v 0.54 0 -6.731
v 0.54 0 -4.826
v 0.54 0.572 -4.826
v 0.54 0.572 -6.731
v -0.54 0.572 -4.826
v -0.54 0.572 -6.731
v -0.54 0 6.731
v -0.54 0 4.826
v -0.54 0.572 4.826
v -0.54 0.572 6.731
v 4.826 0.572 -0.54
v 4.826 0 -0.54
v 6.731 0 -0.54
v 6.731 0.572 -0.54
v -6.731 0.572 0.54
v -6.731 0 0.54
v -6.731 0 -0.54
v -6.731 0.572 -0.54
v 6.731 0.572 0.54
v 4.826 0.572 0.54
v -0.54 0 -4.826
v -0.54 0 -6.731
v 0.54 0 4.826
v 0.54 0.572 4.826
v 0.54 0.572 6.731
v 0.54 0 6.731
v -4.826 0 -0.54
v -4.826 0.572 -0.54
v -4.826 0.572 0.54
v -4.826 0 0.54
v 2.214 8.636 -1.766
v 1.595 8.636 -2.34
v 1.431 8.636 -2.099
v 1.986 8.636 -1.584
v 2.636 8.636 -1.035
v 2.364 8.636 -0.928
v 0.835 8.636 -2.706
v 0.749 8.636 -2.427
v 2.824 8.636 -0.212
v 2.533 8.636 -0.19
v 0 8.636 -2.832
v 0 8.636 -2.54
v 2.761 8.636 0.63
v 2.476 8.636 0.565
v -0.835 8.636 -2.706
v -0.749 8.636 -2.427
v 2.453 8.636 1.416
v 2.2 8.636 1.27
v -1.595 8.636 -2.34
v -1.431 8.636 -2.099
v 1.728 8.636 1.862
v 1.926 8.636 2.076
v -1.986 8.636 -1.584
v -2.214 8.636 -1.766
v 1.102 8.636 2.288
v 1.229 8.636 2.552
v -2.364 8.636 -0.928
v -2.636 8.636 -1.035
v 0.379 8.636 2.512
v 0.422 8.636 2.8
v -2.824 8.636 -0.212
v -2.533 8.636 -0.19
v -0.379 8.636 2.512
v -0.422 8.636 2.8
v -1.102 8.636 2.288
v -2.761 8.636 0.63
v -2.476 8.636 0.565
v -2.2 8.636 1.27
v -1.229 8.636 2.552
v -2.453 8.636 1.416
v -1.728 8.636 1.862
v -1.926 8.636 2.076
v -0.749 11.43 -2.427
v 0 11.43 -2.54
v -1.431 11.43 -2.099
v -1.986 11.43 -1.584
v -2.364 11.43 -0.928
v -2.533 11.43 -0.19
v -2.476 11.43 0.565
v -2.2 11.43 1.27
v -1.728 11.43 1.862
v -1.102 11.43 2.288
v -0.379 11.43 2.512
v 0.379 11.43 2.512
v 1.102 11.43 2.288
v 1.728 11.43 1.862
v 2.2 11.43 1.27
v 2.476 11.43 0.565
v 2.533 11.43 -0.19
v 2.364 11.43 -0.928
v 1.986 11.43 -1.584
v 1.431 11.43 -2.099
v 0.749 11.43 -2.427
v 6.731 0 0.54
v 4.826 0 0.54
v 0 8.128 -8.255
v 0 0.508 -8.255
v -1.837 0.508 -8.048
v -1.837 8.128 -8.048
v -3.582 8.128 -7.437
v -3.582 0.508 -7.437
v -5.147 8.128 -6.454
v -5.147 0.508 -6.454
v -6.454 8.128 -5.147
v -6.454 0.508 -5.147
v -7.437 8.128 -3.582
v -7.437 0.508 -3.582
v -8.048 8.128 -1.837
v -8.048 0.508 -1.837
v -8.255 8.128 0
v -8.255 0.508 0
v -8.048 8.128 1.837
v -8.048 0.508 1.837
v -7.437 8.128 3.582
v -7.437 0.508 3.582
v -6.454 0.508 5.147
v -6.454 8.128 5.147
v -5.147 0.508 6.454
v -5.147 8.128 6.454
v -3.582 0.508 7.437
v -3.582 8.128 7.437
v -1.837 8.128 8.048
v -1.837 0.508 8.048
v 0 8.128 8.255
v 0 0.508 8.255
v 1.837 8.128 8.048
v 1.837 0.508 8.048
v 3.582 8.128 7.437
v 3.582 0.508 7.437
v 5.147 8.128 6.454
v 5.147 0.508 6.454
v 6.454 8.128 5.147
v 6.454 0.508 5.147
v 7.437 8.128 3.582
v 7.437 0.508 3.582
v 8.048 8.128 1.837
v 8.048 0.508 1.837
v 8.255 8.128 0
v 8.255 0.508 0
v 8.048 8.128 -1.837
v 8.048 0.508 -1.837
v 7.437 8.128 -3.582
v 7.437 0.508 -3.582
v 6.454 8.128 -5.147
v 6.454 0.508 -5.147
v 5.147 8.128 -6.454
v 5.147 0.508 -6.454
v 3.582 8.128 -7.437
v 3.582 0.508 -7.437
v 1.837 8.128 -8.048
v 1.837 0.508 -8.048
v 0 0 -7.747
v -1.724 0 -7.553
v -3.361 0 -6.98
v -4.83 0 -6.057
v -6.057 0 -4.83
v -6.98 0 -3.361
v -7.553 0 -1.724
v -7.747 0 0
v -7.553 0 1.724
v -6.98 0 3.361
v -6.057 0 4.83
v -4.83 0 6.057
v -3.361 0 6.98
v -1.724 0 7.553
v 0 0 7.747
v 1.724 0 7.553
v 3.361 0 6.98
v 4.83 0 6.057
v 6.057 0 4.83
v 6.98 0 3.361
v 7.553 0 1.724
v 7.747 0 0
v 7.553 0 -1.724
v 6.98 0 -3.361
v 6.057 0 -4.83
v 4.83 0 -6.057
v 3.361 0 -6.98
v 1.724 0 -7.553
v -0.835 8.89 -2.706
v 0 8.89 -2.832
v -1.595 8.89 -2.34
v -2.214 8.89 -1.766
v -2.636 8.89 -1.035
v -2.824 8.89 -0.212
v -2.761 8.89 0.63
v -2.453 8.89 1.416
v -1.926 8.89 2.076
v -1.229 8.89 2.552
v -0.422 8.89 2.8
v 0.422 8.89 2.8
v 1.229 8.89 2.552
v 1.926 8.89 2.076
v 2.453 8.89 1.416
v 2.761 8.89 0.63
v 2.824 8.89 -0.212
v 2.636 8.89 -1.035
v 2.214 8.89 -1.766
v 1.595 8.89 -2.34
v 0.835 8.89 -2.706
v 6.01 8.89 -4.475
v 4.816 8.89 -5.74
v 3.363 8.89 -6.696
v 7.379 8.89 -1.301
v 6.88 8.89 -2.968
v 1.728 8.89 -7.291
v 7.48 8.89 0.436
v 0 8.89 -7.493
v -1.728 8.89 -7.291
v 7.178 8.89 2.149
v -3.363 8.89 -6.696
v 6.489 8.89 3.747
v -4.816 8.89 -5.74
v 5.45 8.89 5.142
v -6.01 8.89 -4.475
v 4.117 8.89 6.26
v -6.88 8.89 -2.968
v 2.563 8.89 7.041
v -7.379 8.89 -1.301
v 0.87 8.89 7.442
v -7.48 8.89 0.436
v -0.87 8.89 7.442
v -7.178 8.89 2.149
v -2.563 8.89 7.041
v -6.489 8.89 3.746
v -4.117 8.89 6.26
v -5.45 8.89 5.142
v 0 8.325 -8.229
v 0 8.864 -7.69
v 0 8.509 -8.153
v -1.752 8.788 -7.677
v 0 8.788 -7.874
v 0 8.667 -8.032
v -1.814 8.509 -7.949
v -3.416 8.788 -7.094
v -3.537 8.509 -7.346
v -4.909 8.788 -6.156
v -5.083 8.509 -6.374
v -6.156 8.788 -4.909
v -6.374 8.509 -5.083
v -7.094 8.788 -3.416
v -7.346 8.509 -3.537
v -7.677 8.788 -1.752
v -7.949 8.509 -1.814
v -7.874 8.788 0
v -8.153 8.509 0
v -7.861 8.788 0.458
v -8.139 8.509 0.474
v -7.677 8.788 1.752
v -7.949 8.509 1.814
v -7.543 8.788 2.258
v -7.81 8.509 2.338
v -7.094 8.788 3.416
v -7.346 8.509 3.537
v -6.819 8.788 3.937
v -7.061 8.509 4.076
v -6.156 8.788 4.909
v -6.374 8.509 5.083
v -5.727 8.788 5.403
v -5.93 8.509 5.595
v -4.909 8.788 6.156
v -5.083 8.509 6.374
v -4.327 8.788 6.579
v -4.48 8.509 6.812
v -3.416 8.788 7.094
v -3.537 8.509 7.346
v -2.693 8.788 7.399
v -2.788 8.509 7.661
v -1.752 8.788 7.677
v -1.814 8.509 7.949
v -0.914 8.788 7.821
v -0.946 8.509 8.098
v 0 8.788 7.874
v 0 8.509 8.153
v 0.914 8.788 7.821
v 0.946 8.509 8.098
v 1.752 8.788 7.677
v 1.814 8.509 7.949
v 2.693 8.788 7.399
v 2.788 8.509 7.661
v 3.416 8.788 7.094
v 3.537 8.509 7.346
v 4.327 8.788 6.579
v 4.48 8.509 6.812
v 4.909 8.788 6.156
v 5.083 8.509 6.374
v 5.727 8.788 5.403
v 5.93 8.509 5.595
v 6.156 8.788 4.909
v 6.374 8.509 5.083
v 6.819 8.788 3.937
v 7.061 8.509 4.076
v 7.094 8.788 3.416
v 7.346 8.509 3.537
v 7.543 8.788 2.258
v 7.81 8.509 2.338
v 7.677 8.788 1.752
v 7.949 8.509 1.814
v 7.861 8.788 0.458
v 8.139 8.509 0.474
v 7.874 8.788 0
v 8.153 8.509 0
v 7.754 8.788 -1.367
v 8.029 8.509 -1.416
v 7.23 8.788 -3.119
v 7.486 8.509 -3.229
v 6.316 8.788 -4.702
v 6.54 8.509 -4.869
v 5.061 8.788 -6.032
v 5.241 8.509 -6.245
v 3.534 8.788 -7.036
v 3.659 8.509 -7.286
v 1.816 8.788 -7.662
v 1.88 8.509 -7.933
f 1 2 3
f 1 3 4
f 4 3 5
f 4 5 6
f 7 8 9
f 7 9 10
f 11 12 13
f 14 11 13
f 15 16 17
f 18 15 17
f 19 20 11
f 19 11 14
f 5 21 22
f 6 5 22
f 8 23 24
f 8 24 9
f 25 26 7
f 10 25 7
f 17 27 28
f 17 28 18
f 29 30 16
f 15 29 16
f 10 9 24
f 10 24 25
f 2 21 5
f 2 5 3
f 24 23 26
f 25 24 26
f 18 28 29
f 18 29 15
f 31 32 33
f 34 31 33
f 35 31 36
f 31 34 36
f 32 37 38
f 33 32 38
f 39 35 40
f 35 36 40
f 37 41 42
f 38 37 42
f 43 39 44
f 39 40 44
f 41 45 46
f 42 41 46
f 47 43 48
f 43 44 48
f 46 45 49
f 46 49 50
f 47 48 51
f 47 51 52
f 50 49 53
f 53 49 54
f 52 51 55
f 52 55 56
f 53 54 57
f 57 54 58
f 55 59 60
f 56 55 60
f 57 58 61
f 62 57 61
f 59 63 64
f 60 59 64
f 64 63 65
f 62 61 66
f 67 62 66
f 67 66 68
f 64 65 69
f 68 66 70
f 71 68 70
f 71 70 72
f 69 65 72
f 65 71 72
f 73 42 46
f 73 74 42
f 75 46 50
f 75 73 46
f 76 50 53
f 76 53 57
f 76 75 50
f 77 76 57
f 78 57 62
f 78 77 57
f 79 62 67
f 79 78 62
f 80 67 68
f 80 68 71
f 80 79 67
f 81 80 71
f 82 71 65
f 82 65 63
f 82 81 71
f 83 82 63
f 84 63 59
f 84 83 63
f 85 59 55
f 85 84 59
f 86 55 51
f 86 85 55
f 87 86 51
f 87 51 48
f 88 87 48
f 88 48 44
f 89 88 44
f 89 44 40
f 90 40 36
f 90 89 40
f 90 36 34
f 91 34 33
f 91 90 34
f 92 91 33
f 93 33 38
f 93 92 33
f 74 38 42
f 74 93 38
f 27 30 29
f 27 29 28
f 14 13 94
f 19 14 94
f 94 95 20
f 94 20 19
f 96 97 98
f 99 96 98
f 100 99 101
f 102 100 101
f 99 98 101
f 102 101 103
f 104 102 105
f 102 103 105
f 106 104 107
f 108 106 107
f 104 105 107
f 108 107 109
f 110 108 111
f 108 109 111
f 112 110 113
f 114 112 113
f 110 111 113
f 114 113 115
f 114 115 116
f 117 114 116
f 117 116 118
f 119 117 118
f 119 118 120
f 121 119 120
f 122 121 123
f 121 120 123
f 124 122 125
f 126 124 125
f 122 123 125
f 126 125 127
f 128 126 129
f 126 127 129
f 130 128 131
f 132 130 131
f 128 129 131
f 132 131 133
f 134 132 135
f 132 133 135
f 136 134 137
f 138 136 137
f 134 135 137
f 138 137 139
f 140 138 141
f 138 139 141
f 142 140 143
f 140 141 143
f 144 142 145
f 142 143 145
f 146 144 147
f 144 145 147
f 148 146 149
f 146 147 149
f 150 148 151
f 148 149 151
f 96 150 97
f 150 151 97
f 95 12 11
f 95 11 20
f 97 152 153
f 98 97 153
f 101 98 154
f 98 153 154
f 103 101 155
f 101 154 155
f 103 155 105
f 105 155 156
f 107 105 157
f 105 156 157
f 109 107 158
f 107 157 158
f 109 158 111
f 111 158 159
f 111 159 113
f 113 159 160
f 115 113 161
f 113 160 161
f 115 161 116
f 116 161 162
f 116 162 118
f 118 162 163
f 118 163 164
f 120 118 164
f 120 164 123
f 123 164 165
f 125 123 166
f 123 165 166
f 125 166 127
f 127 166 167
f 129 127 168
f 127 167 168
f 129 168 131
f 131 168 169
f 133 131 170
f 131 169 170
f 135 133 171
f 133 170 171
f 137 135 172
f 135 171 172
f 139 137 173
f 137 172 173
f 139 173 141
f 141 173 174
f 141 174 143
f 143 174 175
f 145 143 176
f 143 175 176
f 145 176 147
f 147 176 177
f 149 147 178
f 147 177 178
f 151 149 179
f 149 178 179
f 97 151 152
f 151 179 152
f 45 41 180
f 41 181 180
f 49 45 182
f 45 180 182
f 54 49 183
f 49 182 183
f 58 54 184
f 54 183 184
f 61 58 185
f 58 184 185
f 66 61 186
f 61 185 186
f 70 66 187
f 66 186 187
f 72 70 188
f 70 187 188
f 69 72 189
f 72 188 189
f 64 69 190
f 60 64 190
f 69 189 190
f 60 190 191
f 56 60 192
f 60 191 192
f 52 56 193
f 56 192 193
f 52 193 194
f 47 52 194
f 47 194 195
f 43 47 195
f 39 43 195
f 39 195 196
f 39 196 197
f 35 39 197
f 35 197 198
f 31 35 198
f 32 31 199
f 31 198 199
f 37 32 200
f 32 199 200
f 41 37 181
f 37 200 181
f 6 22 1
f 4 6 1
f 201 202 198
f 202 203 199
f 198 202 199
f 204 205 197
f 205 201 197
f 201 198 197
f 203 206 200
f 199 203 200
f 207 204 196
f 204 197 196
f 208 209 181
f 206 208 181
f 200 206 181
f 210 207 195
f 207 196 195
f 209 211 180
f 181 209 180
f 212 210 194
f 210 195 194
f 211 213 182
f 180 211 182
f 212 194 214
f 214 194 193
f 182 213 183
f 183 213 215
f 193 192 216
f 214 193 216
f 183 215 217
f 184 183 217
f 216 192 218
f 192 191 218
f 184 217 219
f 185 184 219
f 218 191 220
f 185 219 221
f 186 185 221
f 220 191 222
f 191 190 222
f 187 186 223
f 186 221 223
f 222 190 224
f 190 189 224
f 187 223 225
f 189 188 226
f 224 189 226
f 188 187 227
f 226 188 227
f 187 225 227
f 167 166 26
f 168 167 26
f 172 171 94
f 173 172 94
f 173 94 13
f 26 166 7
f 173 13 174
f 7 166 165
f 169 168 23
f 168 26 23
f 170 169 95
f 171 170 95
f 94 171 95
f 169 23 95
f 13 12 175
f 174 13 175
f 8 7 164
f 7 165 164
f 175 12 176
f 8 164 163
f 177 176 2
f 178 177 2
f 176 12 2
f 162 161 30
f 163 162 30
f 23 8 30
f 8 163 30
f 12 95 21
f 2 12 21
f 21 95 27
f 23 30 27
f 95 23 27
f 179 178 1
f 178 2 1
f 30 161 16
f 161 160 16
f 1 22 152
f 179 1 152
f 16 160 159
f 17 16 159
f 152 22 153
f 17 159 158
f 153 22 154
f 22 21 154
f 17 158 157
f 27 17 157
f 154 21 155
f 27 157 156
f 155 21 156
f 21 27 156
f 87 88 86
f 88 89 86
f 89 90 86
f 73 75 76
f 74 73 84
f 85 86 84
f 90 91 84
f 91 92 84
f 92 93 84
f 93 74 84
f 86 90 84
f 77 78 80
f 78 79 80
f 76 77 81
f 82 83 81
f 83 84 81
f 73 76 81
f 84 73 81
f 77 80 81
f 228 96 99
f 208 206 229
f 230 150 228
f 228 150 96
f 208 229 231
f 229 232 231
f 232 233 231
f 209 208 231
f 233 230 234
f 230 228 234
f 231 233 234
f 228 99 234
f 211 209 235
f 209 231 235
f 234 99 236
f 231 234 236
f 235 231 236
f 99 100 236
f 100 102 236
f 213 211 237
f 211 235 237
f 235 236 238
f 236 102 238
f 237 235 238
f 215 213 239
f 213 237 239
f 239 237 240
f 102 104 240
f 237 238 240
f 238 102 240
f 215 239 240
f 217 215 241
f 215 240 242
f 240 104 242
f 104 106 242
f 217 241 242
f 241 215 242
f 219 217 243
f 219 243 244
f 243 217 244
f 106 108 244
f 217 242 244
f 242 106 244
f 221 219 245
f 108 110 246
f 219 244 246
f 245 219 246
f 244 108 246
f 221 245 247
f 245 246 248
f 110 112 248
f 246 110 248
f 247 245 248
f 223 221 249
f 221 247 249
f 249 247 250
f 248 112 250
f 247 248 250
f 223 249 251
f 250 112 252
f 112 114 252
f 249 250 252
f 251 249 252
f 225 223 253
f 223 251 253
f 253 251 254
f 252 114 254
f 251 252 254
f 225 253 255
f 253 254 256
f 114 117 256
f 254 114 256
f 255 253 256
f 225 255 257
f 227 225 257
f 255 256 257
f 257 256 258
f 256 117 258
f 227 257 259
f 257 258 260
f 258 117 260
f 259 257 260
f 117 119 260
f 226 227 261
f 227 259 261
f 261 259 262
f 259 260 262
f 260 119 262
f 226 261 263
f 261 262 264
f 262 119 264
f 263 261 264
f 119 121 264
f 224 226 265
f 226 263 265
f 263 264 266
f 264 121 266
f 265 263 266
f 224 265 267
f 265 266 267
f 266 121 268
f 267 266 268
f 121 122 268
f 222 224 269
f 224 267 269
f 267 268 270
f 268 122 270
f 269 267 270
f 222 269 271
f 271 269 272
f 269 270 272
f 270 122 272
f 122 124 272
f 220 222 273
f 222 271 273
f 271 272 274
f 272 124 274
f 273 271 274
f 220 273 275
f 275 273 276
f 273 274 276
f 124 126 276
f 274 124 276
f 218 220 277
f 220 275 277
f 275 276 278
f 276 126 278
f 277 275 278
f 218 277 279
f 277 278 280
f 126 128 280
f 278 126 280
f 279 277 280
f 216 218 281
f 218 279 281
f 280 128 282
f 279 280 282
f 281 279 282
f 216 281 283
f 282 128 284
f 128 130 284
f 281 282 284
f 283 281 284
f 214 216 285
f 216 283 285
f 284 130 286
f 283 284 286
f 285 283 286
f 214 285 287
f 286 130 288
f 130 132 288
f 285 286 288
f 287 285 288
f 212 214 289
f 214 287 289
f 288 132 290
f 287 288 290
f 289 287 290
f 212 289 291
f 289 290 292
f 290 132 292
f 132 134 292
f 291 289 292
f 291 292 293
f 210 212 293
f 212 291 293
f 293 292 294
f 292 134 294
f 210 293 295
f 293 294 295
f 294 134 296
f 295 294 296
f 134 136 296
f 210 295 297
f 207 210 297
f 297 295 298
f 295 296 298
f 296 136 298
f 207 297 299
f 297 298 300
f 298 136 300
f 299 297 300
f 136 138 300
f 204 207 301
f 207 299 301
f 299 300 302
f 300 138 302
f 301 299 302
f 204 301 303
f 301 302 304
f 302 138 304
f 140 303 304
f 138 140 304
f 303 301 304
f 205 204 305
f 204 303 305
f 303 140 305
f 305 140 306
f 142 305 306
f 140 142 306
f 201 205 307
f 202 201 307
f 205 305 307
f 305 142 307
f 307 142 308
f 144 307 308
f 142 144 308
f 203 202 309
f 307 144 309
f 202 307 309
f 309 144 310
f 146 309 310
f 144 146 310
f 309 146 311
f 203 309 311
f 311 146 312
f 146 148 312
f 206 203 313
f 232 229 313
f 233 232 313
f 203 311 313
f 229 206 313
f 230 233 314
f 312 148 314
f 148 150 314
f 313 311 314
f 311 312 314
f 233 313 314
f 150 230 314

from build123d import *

# Parameters (mm, degrees)
FILLET1_R          = 0.762
CHAMFER1_SIZE      = 0.508
SKETCH2_W          = 1.905
SKETCH2_H          = 1.0795
CUT_EXTRUDE1_DEPTH = 0.5715
CIRPATTERN1_COUNT  = 4


with BuildPart() as part:
    # Sketch1 → Revolve1 (revolve)
    with BuildSketch(Plane.XY, mode=Mode.PRIVATE) as revolve1_sk:
        Polygon((0, 0), (0, 11.43), (2.54, 11.43), (2.54, 8.89), (2.54, 8.636), (2.8321, 8.636), (2.8321, 8.89), (8.255, 8.89), (8.255, 0), align=None)
    revolve(revolve1_sk.sketch.rotate(Axis((0, 0, 0), (0, 1, 0)), 90), axis=Axis((0, 0, 0), (0, 1, 0)))

    # Fillet1
    fillet1_edges = [part.edges().sort_by_distance(p)[0] for p in [
        (0, 8.89, 8.255),
    ]]
    fillet(fillet1_edges, radius=FILLET1_R)

    # Chamfer1
    chamfer1_edges = [part.edges().sort_by_distance(p)[0] for p in [
        (0, 0, 8.255),
    ]]
    chamfer(chamfer1_edges, length=CHAMFER1_SIZE)

    # Sketch2 → Cut-Extrude1 (cut)
    with BuildSketch(Plane.XZ):
        with Locations((5.7785, 0)):
            Rectangle(SKETCH2_W, SKETCH2_H)
    cut_extrude1 = extrude(amount=-CUT_EXTRUDE1_DEPTH, mode=Mode.SUBTRACT)

    # CirPattern1: Cut-Extrude1 ×4 about axis
    cirpattern1_axis = Axis((0, 0, 0), (0, 1, 0))
    for i in range(1, CIRPATTERN1_COUNT):
        add(cut_extrude1.rotate(cirpattern1_axis, i * 360 / CIRPATTERN1_COUNT), mode=Mode.SUBTRACT)


solid = part.part
